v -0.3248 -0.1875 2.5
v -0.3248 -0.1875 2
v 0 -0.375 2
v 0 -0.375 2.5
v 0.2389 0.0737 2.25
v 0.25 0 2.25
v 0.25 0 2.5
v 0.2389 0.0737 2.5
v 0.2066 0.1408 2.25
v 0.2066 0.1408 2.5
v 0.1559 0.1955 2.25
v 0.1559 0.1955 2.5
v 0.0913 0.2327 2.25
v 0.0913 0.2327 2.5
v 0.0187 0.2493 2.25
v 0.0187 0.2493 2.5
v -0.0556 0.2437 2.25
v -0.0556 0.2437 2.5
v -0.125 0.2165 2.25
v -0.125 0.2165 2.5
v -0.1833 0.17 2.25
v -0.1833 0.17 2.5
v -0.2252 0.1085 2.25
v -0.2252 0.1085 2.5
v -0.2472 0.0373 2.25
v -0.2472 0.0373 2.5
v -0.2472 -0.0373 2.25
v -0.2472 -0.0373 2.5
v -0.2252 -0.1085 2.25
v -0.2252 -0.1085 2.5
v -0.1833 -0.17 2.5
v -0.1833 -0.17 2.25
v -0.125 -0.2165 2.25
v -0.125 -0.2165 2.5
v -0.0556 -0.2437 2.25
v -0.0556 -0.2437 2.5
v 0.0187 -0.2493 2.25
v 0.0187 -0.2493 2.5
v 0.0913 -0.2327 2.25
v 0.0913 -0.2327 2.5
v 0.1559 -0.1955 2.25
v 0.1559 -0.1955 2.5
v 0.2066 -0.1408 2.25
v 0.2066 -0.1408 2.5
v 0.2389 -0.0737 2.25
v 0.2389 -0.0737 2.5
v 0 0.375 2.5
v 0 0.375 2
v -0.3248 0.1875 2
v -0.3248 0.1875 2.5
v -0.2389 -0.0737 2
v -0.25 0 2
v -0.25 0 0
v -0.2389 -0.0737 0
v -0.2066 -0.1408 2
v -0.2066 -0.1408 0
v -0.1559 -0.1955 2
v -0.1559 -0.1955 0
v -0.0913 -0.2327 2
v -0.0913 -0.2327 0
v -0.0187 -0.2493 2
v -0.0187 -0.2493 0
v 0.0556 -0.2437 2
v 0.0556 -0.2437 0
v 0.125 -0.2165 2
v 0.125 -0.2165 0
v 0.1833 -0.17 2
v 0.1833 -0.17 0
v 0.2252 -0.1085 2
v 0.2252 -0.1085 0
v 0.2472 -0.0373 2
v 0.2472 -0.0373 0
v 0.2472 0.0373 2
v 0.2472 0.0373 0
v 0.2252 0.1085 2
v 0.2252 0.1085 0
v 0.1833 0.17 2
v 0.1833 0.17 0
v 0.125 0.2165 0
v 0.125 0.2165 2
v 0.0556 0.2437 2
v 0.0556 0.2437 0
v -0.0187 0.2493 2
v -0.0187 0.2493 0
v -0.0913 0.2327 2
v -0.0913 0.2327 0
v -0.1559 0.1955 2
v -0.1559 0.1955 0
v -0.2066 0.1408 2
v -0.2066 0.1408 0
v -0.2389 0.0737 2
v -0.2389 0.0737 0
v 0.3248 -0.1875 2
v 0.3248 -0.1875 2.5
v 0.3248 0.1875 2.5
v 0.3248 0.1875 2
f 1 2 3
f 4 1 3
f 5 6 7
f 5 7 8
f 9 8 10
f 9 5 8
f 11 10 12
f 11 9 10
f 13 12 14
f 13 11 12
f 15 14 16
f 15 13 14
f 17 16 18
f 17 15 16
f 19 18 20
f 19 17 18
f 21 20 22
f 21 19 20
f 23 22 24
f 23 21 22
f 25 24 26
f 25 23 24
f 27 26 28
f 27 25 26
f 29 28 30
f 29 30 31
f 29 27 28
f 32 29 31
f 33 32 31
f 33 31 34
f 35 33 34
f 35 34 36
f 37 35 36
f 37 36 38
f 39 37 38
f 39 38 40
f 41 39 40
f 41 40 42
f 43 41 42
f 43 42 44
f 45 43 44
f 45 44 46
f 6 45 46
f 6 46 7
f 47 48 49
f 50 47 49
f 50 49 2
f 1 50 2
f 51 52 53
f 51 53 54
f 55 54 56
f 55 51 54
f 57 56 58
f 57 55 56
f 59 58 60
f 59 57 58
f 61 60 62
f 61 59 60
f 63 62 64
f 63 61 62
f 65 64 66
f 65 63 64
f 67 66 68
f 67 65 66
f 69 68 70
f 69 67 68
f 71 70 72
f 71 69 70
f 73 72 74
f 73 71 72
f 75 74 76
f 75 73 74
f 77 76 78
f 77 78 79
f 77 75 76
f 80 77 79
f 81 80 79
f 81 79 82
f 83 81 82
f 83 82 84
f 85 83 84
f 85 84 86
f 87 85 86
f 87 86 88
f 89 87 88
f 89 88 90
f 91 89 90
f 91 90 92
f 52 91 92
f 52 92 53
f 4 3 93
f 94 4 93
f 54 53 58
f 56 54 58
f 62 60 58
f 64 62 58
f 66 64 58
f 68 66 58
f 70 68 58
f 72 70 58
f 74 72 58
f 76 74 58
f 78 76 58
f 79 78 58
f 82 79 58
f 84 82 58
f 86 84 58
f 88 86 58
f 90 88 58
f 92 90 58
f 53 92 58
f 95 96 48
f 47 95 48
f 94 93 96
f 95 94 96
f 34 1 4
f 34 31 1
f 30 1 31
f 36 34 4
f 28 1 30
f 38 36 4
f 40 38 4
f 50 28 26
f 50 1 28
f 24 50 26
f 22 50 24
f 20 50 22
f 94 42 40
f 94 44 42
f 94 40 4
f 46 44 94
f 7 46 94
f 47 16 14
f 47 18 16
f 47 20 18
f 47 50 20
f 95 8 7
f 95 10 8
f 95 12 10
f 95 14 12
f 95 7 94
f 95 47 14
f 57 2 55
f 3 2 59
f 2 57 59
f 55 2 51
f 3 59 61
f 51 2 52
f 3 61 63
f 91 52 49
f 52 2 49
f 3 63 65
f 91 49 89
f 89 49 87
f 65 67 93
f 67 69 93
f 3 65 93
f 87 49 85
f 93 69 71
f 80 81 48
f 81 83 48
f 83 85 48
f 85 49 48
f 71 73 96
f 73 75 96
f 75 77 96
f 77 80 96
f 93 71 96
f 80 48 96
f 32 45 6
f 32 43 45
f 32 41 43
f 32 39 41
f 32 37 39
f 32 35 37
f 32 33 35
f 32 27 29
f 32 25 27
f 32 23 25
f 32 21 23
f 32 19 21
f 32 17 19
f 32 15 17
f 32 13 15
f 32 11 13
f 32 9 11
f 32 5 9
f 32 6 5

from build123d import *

# Parameters (mm, degrees)
F0_W     = 0.25
F0_H     = 2
F2_R     = 0.25
F3_DEPTH = 0.5
F4_R     = 0.25
F5_DEPTH = 0.25


# Not quite as in the source:
# - a pattern or mirror of a feature is missing from the dataset's text; its kind, count and spacing are read off the source's solid


with BuildPart() as f1:
    # F0 (on Front) → F1 (revolve)
    with BuildSketch(Plane.XZ):
        with Locations((-0.125, 1)):
            Rectangle(F0_W, F0_H)
    revolve(axis=Axis((0, 0, 1), (0, 0, 1)))

    # F1_copies: F1 across plane


with BuildPart() as f1_1:
    add(f1.part)
    add(f1.part.mirror(Plane.XY.offset(1.125)))

    # F2 (on face) → F3 (join)
    with BuildSketch(Plane.XY.offset(2)):
        Polygon((0.3247595264, 0.1875), (0, 0.375), (-0.3247595264, 0.1875), (-0.3247595264, -0.1875), (0, -0.375), (0.3247595264, -0.1875), align=None)
        Circle(F2_R, mode=Mode.SUBTRACT)
    extrude(amount=F3_DEPTH)

    # F4 (on face) → F5 (cut)
    with BuildSketch(Plane.XY.offset(2.5)):
        Circle(F4_R)
    extrude(amount=-F5_DEPTH, mode=Mode.SUBTRACT)


solid = f1_1.part
